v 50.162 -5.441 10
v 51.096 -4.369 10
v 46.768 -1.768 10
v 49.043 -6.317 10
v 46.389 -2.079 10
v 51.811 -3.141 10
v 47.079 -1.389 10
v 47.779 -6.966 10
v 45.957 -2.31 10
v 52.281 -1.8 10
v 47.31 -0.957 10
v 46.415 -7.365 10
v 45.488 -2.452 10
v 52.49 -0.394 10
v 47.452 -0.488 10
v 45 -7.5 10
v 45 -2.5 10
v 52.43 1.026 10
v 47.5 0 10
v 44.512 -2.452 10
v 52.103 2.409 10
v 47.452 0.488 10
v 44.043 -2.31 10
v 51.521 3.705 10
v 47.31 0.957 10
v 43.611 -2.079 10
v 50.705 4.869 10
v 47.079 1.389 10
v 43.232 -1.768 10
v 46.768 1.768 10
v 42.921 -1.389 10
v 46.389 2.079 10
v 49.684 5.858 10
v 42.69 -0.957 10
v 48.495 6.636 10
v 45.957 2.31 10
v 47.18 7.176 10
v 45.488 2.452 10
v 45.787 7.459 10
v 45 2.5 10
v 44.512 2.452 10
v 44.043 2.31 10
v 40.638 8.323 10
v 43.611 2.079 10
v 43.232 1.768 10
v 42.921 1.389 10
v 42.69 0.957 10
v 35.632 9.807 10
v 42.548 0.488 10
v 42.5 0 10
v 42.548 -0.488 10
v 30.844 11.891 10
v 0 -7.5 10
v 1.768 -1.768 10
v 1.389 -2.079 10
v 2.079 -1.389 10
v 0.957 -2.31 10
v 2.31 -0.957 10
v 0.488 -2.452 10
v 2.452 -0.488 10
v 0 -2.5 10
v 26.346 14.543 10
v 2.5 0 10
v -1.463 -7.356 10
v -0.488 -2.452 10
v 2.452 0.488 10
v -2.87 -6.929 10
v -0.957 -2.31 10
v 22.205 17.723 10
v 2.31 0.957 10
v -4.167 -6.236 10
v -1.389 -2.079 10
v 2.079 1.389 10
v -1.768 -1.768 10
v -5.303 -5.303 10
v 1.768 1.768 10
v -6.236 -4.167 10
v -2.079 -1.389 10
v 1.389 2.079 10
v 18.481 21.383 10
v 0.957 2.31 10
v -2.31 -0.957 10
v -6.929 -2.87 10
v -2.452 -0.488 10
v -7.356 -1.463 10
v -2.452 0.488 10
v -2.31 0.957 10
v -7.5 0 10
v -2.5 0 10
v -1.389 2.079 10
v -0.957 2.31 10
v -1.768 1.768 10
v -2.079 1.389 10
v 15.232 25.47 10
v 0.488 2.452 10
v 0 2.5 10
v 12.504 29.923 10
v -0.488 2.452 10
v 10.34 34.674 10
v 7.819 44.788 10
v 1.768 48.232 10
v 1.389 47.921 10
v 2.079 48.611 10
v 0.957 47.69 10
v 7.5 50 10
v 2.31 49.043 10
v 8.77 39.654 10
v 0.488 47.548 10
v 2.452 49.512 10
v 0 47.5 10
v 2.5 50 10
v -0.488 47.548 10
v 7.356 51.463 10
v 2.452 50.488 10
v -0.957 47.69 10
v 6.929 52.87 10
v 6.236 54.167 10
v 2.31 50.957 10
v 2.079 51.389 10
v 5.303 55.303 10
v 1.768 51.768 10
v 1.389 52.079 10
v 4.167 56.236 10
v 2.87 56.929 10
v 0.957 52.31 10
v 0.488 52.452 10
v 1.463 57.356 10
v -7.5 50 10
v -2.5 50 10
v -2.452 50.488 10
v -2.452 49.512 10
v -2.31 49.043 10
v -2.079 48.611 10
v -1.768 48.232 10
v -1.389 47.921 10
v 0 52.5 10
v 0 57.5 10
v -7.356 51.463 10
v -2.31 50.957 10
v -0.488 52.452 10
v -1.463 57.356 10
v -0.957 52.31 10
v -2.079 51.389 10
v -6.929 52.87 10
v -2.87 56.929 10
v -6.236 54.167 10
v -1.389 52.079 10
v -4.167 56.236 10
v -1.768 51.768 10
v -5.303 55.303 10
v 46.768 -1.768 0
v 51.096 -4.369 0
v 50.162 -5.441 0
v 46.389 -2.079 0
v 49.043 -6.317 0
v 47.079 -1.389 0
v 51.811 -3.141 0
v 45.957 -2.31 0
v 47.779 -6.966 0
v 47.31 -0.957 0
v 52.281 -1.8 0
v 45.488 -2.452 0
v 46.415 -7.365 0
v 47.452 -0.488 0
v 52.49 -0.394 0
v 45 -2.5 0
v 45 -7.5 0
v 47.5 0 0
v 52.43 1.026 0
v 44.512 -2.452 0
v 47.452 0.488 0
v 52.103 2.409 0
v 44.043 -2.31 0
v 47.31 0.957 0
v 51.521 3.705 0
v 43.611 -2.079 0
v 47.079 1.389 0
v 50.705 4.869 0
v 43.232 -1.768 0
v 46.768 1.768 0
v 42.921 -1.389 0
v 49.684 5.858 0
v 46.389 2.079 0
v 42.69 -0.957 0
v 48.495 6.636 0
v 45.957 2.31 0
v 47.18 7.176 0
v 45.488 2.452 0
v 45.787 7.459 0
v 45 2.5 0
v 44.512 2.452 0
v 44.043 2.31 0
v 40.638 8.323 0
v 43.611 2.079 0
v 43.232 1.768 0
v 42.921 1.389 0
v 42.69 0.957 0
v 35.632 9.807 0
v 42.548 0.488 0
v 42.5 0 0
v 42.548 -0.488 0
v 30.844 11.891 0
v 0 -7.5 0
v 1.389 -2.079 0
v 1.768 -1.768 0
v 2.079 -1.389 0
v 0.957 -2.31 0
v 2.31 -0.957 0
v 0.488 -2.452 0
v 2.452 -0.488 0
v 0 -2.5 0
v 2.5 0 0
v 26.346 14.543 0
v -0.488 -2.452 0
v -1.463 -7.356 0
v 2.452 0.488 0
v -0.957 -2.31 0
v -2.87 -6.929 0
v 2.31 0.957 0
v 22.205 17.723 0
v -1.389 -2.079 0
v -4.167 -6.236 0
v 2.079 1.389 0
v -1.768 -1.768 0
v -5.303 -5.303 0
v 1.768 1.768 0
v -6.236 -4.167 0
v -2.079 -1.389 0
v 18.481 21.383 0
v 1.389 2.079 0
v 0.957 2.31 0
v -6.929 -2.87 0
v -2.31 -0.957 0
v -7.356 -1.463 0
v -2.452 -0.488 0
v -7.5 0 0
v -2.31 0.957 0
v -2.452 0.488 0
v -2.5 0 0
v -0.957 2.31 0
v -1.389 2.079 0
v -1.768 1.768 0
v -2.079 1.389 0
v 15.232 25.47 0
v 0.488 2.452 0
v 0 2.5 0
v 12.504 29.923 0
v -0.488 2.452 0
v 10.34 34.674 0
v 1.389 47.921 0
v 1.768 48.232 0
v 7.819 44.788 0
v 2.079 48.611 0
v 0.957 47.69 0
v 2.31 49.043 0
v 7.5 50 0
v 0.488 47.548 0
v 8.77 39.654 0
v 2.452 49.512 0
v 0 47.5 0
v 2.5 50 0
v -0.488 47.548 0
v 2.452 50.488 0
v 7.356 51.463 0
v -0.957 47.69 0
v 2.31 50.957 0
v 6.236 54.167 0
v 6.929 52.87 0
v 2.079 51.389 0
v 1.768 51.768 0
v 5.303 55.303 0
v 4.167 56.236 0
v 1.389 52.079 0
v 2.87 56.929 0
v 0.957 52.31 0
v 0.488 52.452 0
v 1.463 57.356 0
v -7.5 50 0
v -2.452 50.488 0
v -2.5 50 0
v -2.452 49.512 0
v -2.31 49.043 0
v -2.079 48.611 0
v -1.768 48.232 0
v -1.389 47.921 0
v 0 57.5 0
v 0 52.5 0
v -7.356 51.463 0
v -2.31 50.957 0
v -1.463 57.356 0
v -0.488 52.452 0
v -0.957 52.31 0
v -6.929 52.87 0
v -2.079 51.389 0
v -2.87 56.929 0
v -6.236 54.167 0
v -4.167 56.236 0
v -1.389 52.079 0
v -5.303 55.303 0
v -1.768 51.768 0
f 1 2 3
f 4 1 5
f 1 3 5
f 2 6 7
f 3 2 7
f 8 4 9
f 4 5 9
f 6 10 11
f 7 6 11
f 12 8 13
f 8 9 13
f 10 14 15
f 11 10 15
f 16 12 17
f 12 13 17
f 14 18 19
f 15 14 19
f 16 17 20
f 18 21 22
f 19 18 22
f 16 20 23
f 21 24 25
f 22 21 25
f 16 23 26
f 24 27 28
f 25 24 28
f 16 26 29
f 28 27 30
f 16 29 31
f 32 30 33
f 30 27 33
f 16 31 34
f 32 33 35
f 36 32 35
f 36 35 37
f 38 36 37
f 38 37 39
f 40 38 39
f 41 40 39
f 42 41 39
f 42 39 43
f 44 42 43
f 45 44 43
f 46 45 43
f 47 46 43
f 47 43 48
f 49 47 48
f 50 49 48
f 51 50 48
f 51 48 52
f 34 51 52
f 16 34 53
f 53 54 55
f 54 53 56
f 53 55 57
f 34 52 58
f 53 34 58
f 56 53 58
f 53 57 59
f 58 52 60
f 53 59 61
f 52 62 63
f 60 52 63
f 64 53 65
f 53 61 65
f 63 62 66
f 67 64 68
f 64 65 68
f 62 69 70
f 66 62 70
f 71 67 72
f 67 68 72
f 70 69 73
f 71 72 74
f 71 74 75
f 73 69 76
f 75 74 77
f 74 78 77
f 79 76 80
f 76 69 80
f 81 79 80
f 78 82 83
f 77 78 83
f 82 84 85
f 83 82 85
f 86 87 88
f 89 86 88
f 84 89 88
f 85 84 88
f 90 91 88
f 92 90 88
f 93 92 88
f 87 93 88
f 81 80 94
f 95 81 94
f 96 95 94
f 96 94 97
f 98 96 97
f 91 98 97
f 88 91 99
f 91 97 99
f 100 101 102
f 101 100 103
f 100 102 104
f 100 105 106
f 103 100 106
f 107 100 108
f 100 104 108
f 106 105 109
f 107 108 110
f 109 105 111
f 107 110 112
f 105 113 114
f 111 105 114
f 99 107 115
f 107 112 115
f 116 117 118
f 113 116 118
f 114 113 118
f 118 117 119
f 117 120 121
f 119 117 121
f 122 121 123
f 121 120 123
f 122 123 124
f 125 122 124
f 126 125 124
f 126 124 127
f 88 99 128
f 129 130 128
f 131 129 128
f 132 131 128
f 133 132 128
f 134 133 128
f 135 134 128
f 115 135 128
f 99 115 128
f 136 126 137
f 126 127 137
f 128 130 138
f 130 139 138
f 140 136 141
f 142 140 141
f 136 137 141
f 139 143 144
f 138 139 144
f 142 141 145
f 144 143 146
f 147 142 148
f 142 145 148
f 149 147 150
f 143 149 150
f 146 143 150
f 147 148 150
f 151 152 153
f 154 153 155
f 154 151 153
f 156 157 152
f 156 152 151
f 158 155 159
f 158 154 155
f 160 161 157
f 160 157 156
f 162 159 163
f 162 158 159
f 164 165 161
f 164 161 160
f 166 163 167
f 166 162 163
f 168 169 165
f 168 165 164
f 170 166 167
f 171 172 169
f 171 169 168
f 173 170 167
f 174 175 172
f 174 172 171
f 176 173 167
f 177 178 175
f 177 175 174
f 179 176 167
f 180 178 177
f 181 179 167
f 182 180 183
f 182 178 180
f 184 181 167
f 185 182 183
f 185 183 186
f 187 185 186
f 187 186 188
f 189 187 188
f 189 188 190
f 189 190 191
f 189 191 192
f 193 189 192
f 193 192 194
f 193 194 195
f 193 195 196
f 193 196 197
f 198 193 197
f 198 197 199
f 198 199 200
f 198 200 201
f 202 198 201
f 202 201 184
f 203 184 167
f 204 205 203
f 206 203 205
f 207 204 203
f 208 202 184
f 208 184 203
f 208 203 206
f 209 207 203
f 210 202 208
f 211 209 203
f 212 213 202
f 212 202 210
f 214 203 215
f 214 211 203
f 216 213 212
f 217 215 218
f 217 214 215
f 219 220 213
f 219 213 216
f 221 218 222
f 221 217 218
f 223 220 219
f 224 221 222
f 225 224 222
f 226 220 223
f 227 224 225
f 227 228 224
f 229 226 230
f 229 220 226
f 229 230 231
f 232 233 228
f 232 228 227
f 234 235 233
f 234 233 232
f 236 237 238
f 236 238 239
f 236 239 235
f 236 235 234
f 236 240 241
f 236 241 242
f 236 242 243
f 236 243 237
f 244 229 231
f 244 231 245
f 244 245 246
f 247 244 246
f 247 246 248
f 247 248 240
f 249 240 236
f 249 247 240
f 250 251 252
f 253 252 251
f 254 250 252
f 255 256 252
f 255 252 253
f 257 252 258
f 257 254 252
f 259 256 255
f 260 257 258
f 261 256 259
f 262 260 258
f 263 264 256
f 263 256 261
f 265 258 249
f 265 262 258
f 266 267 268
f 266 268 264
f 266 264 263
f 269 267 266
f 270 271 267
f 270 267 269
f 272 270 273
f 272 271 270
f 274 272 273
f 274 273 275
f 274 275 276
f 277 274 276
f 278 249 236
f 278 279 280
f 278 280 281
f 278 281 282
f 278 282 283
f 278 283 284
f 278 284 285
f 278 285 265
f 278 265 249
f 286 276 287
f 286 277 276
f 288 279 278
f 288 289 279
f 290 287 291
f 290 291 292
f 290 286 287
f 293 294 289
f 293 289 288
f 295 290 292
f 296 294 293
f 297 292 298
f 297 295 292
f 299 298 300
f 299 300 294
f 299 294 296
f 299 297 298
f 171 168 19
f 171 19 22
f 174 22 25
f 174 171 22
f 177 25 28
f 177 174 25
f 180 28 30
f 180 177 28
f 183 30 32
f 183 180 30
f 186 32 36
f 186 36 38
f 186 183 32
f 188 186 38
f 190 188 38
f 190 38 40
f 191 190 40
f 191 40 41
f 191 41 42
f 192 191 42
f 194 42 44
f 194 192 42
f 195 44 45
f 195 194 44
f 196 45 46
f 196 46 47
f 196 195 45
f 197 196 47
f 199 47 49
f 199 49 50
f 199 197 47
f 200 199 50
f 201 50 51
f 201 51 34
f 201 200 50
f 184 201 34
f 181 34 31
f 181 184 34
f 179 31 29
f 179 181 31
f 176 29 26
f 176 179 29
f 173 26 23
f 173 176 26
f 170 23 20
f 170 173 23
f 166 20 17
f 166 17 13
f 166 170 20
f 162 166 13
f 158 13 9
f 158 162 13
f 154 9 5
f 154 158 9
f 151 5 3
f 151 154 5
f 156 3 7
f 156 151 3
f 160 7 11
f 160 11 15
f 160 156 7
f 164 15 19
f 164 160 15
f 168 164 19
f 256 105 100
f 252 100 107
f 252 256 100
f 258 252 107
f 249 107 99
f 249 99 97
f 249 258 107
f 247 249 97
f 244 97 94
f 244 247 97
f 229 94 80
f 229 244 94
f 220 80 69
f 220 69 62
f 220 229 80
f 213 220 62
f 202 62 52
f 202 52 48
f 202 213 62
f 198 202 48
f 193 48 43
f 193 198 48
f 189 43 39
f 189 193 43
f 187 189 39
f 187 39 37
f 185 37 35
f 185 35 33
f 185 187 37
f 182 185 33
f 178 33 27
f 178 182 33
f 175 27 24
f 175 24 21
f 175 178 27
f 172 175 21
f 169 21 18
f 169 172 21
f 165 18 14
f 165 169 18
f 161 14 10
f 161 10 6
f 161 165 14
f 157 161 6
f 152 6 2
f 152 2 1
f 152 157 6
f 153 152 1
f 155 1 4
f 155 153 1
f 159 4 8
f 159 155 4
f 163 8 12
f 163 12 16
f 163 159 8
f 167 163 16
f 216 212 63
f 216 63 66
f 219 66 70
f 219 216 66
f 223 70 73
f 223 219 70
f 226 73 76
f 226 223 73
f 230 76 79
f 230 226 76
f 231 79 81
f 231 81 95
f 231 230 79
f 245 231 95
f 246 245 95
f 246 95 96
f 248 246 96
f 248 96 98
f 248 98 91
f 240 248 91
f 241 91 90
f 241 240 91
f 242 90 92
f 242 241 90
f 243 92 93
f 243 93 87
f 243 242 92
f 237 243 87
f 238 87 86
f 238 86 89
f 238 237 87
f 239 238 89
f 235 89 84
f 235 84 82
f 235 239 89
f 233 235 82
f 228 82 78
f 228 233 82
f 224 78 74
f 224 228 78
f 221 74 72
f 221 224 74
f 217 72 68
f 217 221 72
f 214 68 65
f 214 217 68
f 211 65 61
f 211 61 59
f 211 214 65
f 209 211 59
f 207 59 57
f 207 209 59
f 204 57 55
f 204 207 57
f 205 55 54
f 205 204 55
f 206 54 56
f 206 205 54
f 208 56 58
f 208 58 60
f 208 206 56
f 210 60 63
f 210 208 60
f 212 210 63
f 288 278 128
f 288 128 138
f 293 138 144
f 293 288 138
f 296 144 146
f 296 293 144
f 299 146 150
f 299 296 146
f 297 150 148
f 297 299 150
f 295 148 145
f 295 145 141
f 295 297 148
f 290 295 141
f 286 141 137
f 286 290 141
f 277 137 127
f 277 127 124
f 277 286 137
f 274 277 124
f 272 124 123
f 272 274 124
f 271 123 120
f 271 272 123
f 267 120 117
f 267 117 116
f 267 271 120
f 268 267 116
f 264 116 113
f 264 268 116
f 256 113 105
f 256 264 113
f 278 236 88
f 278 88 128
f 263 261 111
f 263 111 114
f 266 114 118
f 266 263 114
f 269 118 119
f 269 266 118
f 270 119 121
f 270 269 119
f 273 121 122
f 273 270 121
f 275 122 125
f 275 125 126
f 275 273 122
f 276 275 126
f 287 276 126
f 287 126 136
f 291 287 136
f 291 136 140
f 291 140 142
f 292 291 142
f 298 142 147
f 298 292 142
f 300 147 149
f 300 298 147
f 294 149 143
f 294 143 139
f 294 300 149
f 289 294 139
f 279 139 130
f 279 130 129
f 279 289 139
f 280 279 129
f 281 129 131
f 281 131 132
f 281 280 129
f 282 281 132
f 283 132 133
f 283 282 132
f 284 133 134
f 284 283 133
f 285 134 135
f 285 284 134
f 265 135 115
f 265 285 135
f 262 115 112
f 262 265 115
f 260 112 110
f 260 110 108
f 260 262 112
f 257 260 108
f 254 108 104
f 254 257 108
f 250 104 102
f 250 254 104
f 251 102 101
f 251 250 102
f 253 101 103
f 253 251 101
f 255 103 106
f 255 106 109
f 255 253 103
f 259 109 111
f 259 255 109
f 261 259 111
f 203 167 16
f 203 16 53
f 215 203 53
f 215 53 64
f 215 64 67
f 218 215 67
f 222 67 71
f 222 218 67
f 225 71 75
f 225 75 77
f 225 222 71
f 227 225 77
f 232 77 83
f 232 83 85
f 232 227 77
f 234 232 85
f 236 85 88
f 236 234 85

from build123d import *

# Parameters (mm, degrees)
SKETCH1_R           = 2.5
BOSS_EXTRUDE1_DEPTH = 10


with BuildPart() as part:
    # Sketch1 → Boss-Extrude1 (new body)
    with BuildSketch(Plane.XY):
        with BuildLine():
            Line((-7.5, 0), (-7.5, 50))
            ThreePointArc((-7.5, 50), (0, 57.5), (7.5, 50))
            ThreePointArc((7.5, 50), (18.481305966, 21.383175369), (45.787292818, 7.458563536))
            ThreePointArc((45.787292818, 7.458563536), (52.48963372, -0.394191248), (45, -7.5))
            Line((45, -7.5), (0, -7.5))
            ThreePointArc((0, -7.5), (-5.303300859, -5.303300859), (-7.5, 0))
        make_face()
        Circle(SKETCH1_R, mode=Mode.SUBTRACT)
        with Locations((45, 0)):
            Circle(SKETCH1_R, mode=Mode.SUBTRACT)
        with Locations((0, 50)):
            Circle(SKETCH1_R, mode=Mode.SUBTRACT)
    extrude(amount=BOSS_EXTRUDE1_DEPTH)


solid = part.part
